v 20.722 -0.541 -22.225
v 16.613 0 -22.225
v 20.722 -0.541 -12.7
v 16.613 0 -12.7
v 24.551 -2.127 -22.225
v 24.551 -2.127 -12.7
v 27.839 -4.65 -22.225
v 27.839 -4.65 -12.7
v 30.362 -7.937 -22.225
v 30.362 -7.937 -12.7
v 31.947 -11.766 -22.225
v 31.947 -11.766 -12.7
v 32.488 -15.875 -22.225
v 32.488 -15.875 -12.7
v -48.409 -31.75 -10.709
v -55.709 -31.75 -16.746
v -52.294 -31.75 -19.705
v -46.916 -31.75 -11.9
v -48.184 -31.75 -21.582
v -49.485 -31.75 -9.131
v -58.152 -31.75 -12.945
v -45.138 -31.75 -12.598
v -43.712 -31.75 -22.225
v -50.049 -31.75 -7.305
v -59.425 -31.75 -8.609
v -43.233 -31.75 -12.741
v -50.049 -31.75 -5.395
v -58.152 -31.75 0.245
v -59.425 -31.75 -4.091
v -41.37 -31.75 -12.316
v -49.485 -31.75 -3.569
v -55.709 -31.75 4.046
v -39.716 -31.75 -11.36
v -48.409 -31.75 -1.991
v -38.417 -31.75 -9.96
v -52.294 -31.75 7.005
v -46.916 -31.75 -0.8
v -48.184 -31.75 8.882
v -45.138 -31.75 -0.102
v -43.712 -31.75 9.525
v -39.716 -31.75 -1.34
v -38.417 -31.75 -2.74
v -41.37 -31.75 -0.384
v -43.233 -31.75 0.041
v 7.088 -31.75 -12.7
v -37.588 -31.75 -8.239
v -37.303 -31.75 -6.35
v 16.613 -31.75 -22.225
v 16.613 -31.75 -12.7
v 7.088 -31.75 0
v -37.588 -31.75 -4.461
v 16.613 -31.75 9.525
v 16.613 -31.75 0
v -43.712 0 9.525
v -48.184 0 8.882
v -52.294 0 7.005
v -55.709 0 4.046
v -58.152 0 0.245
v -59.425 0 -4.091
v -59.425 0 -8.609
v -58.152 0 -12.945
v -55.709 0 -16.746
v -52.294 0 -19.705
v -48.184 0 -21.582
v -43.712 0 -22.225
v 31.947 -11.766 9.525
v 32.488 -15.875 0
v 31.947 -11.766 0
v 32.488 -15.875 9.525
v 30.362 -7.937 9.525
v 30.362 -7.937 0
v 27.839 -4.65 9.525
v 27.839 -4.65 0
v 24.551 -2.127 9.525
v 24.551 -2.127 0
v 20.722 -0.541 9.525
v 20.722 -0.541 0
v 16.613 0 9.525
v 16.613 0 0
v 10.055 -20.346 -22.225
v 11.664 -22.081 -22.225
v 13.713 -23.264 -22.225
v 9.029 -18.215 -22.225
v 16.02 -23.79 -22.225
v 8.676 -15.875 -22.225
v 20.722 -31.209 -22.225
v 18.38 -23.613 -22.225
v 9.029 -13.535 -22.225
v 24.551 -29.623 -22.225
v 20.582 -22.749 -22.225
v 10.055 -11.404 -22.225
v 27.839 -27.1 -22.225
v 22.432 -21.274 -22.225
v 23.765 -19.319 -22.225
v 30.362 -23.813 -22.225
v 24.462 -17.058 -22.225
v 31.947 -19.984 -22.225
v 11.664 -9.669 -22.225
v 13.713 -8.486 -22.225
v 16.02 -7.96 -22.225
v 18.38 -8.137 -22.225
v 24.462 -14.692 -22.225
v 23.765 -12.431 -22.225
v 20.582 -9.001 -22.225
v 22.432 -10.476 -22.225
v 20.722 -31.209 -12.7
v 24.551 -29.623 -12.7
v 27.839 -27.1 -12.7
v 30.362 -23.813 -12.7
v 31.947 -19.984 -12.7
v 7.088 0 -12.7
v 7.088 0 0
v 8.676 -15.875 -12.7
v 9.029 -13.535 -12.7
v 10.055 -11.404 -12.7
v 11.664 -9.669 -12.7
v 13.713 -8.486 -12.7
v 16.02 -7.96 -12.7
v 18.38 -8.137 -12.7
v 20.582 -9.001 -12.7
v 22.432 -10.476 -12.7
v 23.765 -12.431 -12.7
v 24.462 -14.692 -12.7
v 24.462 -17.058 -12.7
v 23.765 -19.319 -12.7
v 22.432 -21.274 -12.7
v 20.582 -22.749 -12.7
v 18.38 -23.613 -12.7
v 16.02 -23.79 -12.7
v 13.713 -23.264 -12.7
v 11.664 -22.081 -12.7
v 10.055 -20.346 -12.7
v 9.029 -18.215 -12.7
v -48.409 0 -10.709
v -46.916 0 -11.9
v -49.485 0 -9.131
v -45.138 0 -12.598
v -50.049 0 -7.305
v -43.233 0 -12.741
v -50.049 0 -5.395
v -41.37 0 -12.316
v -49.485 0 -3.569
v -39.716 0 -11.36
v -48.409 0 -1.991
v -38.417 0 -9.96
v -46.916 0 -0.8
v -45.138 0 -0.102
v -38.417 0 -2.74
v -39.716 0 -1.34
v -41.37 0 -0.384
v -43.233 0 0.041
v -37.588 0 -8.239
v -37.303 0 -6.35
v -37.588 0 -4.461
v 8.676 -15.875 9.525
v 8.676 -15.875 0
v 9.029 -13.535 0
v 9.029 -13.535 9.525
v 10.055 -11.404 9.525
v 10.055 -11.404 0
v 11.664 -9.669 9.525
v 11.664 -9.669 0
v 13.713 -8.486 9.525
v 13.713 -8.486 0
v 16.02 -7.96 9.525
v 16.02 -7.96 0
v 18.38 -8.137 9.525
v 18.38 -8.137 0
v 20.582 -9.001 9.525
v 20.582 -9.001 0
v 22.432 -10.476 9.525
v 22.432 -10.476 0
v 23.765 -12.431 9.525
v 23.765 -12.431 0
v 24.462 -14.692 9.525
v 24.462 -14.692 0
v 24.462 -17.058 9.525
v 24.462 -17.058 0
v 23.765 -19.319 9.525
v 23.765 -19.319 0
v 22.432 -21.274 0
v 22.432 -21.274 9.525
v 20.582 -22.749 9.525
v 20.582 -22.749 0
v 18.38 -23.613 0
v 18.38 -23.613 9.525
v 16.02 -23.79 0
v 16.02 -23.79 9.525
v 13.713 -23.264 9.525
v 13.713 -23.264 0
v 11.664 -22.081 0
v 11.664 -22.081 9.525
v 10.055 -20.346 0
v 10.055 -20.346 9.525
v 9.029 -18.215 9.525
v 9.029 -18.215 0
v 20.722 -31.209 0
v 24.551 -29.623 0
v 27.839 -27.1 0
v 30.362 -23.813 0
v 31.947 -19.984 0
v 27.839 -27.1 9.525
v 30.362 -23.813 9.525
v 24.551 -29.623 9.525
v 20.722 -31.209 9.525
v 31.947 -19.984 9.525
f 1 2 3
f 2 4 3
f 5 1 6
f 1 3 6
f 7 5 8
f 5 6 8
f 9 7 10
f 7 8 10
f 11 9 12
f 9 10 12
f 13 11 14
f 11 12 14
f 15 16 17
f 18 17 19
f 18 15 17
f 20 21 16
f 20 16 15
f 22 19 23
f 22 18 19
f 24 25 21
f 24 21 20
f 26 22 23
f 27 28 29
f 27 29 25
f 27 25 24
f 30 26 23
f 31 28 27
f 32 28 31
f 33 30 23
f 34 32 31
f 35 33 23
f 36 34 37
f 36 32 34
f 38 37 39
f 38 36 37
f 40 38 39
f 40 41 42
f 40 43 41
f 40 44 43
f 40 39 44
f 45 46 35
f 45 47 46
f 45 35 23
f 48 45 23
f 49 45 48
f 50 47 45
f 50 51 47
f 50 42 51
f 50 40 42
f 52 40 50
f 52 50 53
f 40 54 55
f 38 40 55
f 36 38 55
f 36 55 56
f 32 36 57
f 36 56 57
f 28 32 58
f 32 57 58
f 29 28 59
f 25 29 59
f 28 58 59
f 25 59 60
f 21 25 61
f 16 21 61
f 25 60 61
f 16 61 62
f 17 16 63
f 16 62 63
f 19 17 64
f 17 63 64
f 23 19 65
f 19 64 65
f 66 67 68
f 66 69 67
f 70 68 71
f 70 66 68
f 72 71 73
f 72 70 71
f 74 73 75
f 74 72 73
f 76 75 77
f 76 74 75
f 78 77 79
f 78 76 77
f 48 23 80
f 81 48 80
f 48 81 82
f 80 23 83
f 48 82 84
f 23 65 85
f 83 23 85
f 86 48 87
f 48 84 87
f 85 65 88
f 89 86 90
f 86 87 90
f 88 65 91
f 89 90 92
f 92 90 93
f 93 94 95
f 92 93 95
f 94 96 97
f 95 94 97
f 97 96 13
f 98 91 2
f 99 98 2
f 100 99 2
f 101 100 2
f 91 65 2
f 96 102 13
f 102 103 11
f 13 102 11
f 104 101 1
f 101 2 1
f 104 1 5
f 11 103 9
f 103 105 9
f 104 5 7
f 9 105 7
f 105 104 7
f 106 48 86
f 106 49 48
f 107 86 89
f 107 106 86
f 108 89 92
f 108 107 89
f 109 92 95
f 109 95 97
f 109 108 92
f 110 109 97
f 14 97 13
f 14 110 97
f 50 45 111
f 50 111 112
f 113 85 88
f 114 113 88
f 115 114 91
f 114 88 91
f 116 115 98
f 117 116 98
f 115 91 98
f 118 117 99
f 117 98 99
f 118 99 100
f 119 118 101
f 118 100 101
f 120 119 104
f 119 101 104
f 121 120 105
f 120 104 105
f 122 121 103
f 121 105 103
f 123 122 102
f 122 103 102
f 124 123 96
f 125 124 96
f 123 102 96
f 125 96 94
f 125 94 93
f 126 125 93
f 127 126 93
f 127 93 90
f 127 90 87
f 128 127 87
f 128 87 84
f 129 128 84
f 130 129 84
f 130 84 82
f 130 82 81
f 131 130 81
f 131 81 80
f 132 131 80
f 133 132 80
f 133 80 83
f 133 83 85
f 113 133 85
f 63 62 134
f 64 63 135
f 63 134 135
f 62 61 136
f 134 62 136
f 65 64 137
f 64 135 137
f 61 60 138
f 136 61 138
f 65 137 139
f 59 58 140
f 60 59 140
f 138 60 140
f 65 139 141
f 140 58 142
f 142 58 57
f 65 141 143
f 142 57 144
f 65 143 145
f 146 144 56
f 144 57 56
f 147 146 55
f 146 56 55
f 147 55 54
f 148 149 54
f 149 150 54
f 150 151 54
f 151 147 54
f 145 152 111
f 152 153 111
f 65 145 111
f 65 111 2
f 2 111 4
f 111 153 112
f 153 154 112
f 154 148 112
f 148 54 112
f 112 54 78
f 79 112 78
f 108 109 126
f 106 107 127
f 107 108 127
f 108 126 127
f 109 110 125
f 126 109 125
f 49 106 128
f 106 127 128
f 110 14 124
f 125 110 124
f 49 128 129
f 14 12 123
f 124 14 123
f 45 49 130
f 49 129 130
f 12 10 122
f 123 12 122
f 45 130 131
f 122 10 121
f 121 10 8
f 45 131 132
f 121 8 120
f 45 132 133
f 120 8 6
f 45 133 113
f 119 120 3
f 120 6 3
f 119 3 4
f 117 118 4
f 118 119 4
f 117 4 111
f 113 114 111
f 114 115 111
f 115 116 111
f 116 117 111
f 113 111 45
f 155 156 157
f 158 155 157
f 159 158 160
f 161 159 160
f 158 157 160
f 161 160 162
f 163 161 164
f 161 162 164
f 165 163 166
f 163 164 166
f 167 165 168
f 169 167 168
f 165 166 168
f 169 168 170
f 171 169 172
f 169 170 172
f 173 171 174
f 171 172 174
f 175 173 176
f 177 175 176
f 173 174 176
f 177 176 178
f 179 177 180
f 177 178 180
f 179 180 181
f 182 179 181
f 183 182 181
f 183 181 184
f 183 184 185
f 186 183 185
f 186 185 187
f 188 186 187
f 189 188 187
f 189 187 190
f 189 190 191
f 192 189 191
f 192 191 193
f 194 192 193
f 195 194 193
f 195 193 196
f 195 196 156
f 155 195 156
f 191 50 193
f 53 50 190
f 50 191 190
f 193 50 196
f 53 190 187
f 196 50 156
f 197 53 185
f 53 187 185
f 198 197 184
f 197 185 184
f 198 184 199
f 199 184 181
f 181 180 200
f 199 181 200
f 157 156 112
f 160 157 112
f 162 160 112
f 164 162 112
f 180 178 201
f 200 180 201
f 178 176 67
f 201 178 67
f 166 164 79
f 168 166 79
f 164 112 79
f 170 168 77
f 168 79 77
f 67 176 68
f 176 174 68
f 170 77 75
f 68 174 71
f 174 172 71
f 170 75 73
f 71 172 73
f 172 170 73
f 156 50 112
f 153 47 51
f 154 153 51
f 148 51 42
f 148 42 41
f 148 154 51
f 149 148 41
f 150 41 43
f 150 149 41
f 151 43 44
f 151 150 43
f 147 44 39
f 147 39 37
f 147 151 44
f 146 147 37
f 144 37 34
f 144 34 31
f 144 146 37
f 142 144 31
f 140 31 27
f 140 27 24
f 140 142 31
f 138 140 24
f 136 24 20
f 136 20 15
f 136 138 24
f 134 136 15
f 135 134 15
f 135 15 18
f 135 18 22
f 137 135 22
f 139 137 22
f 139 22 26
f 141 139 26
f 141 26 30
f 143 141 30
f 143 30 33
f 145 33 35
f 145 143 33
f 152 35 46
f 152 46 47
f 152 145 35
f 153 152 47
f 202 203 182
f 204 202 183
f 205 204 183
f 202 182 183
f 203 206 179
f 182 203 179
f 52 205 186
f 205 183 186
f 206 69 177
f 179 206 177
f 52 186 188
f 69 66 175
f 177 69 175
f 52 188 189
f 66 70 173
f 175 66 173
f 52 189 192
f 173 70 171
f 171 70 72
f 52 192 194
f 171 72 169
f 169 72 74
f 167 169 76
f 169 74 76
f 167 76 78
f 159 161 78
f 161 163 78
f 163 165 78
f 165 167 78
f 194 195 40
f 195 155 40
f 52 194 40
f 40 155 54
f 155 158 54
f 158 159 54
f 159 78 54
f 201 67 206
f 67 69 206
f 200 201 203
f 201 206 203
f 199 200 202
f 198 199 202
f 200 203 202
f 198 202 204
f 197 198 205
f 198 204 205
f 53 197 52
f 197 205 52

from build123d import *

# Parameters (mm, degrees)
F0_R     = 6.4084954246
F1_DEPTH = 31.75
F3_D     = 15.875
F4_R     = 15.87499


# Not quite as in the source:
# - a fillet or chamfer is up to 0.001 mm smaller than in the source, because OpenCascade refuses the exact size


with BuildPart() as f1:
    # F0 (on Front) → F1 (new body)
    with BuildSketch(Plane.XZ):
        with BuildLine():
            Line((32.4883715089, 9.525), (-43.7116284911, 9.525))
            ThreePointArc((-43.7116284911, 9.525), (-59.5866284911, -6.35), (-43.7116284911, -22.225))
            Line((-43.7116284911, -22.225), (32.4883715089, -22.225))
            Line((32.4883715089, -22.225), (32.4883715089, -12.7))
            Line((32.4883715089, -12.7), (7.0883715089, -12.7))
            Line((7.0883715089, -12.7), (7.0883715089, 0))
            Line((7.0883715089, 0), (32.4883715089, 0))
            Line((32.4883715089, 0), (32.4883715089, 9.525))
        make_face()
        with Locations((-43.7116284911, -6.35)):
            Circle(F0_R, mode=Mode.SUBTRACT)
    extrude(amount=F1_DEPTH)

    # F3 (through all)
    with Locations(Plane.XY.offset(9.525)):
        with Locations((16.6133715089, -15.875)):
            Hole(F3_D / 2)

    # F4 (radius 15.875 in the source; OpenCascade refuses exactly that, so slightly less here)
    f4_edges = [f1.edges().sort_by_distance(p)[0] for p in [
        (32.488372, -31.75, 4.7625),
        (32.488372, 0, 4.7625),
        (32.488372, -31.75, -17.4625),
        (32.488372, 0, -17.4625),
    ]]
    fillet(f4_edges, radius=F4_R)


solid = f1.part
